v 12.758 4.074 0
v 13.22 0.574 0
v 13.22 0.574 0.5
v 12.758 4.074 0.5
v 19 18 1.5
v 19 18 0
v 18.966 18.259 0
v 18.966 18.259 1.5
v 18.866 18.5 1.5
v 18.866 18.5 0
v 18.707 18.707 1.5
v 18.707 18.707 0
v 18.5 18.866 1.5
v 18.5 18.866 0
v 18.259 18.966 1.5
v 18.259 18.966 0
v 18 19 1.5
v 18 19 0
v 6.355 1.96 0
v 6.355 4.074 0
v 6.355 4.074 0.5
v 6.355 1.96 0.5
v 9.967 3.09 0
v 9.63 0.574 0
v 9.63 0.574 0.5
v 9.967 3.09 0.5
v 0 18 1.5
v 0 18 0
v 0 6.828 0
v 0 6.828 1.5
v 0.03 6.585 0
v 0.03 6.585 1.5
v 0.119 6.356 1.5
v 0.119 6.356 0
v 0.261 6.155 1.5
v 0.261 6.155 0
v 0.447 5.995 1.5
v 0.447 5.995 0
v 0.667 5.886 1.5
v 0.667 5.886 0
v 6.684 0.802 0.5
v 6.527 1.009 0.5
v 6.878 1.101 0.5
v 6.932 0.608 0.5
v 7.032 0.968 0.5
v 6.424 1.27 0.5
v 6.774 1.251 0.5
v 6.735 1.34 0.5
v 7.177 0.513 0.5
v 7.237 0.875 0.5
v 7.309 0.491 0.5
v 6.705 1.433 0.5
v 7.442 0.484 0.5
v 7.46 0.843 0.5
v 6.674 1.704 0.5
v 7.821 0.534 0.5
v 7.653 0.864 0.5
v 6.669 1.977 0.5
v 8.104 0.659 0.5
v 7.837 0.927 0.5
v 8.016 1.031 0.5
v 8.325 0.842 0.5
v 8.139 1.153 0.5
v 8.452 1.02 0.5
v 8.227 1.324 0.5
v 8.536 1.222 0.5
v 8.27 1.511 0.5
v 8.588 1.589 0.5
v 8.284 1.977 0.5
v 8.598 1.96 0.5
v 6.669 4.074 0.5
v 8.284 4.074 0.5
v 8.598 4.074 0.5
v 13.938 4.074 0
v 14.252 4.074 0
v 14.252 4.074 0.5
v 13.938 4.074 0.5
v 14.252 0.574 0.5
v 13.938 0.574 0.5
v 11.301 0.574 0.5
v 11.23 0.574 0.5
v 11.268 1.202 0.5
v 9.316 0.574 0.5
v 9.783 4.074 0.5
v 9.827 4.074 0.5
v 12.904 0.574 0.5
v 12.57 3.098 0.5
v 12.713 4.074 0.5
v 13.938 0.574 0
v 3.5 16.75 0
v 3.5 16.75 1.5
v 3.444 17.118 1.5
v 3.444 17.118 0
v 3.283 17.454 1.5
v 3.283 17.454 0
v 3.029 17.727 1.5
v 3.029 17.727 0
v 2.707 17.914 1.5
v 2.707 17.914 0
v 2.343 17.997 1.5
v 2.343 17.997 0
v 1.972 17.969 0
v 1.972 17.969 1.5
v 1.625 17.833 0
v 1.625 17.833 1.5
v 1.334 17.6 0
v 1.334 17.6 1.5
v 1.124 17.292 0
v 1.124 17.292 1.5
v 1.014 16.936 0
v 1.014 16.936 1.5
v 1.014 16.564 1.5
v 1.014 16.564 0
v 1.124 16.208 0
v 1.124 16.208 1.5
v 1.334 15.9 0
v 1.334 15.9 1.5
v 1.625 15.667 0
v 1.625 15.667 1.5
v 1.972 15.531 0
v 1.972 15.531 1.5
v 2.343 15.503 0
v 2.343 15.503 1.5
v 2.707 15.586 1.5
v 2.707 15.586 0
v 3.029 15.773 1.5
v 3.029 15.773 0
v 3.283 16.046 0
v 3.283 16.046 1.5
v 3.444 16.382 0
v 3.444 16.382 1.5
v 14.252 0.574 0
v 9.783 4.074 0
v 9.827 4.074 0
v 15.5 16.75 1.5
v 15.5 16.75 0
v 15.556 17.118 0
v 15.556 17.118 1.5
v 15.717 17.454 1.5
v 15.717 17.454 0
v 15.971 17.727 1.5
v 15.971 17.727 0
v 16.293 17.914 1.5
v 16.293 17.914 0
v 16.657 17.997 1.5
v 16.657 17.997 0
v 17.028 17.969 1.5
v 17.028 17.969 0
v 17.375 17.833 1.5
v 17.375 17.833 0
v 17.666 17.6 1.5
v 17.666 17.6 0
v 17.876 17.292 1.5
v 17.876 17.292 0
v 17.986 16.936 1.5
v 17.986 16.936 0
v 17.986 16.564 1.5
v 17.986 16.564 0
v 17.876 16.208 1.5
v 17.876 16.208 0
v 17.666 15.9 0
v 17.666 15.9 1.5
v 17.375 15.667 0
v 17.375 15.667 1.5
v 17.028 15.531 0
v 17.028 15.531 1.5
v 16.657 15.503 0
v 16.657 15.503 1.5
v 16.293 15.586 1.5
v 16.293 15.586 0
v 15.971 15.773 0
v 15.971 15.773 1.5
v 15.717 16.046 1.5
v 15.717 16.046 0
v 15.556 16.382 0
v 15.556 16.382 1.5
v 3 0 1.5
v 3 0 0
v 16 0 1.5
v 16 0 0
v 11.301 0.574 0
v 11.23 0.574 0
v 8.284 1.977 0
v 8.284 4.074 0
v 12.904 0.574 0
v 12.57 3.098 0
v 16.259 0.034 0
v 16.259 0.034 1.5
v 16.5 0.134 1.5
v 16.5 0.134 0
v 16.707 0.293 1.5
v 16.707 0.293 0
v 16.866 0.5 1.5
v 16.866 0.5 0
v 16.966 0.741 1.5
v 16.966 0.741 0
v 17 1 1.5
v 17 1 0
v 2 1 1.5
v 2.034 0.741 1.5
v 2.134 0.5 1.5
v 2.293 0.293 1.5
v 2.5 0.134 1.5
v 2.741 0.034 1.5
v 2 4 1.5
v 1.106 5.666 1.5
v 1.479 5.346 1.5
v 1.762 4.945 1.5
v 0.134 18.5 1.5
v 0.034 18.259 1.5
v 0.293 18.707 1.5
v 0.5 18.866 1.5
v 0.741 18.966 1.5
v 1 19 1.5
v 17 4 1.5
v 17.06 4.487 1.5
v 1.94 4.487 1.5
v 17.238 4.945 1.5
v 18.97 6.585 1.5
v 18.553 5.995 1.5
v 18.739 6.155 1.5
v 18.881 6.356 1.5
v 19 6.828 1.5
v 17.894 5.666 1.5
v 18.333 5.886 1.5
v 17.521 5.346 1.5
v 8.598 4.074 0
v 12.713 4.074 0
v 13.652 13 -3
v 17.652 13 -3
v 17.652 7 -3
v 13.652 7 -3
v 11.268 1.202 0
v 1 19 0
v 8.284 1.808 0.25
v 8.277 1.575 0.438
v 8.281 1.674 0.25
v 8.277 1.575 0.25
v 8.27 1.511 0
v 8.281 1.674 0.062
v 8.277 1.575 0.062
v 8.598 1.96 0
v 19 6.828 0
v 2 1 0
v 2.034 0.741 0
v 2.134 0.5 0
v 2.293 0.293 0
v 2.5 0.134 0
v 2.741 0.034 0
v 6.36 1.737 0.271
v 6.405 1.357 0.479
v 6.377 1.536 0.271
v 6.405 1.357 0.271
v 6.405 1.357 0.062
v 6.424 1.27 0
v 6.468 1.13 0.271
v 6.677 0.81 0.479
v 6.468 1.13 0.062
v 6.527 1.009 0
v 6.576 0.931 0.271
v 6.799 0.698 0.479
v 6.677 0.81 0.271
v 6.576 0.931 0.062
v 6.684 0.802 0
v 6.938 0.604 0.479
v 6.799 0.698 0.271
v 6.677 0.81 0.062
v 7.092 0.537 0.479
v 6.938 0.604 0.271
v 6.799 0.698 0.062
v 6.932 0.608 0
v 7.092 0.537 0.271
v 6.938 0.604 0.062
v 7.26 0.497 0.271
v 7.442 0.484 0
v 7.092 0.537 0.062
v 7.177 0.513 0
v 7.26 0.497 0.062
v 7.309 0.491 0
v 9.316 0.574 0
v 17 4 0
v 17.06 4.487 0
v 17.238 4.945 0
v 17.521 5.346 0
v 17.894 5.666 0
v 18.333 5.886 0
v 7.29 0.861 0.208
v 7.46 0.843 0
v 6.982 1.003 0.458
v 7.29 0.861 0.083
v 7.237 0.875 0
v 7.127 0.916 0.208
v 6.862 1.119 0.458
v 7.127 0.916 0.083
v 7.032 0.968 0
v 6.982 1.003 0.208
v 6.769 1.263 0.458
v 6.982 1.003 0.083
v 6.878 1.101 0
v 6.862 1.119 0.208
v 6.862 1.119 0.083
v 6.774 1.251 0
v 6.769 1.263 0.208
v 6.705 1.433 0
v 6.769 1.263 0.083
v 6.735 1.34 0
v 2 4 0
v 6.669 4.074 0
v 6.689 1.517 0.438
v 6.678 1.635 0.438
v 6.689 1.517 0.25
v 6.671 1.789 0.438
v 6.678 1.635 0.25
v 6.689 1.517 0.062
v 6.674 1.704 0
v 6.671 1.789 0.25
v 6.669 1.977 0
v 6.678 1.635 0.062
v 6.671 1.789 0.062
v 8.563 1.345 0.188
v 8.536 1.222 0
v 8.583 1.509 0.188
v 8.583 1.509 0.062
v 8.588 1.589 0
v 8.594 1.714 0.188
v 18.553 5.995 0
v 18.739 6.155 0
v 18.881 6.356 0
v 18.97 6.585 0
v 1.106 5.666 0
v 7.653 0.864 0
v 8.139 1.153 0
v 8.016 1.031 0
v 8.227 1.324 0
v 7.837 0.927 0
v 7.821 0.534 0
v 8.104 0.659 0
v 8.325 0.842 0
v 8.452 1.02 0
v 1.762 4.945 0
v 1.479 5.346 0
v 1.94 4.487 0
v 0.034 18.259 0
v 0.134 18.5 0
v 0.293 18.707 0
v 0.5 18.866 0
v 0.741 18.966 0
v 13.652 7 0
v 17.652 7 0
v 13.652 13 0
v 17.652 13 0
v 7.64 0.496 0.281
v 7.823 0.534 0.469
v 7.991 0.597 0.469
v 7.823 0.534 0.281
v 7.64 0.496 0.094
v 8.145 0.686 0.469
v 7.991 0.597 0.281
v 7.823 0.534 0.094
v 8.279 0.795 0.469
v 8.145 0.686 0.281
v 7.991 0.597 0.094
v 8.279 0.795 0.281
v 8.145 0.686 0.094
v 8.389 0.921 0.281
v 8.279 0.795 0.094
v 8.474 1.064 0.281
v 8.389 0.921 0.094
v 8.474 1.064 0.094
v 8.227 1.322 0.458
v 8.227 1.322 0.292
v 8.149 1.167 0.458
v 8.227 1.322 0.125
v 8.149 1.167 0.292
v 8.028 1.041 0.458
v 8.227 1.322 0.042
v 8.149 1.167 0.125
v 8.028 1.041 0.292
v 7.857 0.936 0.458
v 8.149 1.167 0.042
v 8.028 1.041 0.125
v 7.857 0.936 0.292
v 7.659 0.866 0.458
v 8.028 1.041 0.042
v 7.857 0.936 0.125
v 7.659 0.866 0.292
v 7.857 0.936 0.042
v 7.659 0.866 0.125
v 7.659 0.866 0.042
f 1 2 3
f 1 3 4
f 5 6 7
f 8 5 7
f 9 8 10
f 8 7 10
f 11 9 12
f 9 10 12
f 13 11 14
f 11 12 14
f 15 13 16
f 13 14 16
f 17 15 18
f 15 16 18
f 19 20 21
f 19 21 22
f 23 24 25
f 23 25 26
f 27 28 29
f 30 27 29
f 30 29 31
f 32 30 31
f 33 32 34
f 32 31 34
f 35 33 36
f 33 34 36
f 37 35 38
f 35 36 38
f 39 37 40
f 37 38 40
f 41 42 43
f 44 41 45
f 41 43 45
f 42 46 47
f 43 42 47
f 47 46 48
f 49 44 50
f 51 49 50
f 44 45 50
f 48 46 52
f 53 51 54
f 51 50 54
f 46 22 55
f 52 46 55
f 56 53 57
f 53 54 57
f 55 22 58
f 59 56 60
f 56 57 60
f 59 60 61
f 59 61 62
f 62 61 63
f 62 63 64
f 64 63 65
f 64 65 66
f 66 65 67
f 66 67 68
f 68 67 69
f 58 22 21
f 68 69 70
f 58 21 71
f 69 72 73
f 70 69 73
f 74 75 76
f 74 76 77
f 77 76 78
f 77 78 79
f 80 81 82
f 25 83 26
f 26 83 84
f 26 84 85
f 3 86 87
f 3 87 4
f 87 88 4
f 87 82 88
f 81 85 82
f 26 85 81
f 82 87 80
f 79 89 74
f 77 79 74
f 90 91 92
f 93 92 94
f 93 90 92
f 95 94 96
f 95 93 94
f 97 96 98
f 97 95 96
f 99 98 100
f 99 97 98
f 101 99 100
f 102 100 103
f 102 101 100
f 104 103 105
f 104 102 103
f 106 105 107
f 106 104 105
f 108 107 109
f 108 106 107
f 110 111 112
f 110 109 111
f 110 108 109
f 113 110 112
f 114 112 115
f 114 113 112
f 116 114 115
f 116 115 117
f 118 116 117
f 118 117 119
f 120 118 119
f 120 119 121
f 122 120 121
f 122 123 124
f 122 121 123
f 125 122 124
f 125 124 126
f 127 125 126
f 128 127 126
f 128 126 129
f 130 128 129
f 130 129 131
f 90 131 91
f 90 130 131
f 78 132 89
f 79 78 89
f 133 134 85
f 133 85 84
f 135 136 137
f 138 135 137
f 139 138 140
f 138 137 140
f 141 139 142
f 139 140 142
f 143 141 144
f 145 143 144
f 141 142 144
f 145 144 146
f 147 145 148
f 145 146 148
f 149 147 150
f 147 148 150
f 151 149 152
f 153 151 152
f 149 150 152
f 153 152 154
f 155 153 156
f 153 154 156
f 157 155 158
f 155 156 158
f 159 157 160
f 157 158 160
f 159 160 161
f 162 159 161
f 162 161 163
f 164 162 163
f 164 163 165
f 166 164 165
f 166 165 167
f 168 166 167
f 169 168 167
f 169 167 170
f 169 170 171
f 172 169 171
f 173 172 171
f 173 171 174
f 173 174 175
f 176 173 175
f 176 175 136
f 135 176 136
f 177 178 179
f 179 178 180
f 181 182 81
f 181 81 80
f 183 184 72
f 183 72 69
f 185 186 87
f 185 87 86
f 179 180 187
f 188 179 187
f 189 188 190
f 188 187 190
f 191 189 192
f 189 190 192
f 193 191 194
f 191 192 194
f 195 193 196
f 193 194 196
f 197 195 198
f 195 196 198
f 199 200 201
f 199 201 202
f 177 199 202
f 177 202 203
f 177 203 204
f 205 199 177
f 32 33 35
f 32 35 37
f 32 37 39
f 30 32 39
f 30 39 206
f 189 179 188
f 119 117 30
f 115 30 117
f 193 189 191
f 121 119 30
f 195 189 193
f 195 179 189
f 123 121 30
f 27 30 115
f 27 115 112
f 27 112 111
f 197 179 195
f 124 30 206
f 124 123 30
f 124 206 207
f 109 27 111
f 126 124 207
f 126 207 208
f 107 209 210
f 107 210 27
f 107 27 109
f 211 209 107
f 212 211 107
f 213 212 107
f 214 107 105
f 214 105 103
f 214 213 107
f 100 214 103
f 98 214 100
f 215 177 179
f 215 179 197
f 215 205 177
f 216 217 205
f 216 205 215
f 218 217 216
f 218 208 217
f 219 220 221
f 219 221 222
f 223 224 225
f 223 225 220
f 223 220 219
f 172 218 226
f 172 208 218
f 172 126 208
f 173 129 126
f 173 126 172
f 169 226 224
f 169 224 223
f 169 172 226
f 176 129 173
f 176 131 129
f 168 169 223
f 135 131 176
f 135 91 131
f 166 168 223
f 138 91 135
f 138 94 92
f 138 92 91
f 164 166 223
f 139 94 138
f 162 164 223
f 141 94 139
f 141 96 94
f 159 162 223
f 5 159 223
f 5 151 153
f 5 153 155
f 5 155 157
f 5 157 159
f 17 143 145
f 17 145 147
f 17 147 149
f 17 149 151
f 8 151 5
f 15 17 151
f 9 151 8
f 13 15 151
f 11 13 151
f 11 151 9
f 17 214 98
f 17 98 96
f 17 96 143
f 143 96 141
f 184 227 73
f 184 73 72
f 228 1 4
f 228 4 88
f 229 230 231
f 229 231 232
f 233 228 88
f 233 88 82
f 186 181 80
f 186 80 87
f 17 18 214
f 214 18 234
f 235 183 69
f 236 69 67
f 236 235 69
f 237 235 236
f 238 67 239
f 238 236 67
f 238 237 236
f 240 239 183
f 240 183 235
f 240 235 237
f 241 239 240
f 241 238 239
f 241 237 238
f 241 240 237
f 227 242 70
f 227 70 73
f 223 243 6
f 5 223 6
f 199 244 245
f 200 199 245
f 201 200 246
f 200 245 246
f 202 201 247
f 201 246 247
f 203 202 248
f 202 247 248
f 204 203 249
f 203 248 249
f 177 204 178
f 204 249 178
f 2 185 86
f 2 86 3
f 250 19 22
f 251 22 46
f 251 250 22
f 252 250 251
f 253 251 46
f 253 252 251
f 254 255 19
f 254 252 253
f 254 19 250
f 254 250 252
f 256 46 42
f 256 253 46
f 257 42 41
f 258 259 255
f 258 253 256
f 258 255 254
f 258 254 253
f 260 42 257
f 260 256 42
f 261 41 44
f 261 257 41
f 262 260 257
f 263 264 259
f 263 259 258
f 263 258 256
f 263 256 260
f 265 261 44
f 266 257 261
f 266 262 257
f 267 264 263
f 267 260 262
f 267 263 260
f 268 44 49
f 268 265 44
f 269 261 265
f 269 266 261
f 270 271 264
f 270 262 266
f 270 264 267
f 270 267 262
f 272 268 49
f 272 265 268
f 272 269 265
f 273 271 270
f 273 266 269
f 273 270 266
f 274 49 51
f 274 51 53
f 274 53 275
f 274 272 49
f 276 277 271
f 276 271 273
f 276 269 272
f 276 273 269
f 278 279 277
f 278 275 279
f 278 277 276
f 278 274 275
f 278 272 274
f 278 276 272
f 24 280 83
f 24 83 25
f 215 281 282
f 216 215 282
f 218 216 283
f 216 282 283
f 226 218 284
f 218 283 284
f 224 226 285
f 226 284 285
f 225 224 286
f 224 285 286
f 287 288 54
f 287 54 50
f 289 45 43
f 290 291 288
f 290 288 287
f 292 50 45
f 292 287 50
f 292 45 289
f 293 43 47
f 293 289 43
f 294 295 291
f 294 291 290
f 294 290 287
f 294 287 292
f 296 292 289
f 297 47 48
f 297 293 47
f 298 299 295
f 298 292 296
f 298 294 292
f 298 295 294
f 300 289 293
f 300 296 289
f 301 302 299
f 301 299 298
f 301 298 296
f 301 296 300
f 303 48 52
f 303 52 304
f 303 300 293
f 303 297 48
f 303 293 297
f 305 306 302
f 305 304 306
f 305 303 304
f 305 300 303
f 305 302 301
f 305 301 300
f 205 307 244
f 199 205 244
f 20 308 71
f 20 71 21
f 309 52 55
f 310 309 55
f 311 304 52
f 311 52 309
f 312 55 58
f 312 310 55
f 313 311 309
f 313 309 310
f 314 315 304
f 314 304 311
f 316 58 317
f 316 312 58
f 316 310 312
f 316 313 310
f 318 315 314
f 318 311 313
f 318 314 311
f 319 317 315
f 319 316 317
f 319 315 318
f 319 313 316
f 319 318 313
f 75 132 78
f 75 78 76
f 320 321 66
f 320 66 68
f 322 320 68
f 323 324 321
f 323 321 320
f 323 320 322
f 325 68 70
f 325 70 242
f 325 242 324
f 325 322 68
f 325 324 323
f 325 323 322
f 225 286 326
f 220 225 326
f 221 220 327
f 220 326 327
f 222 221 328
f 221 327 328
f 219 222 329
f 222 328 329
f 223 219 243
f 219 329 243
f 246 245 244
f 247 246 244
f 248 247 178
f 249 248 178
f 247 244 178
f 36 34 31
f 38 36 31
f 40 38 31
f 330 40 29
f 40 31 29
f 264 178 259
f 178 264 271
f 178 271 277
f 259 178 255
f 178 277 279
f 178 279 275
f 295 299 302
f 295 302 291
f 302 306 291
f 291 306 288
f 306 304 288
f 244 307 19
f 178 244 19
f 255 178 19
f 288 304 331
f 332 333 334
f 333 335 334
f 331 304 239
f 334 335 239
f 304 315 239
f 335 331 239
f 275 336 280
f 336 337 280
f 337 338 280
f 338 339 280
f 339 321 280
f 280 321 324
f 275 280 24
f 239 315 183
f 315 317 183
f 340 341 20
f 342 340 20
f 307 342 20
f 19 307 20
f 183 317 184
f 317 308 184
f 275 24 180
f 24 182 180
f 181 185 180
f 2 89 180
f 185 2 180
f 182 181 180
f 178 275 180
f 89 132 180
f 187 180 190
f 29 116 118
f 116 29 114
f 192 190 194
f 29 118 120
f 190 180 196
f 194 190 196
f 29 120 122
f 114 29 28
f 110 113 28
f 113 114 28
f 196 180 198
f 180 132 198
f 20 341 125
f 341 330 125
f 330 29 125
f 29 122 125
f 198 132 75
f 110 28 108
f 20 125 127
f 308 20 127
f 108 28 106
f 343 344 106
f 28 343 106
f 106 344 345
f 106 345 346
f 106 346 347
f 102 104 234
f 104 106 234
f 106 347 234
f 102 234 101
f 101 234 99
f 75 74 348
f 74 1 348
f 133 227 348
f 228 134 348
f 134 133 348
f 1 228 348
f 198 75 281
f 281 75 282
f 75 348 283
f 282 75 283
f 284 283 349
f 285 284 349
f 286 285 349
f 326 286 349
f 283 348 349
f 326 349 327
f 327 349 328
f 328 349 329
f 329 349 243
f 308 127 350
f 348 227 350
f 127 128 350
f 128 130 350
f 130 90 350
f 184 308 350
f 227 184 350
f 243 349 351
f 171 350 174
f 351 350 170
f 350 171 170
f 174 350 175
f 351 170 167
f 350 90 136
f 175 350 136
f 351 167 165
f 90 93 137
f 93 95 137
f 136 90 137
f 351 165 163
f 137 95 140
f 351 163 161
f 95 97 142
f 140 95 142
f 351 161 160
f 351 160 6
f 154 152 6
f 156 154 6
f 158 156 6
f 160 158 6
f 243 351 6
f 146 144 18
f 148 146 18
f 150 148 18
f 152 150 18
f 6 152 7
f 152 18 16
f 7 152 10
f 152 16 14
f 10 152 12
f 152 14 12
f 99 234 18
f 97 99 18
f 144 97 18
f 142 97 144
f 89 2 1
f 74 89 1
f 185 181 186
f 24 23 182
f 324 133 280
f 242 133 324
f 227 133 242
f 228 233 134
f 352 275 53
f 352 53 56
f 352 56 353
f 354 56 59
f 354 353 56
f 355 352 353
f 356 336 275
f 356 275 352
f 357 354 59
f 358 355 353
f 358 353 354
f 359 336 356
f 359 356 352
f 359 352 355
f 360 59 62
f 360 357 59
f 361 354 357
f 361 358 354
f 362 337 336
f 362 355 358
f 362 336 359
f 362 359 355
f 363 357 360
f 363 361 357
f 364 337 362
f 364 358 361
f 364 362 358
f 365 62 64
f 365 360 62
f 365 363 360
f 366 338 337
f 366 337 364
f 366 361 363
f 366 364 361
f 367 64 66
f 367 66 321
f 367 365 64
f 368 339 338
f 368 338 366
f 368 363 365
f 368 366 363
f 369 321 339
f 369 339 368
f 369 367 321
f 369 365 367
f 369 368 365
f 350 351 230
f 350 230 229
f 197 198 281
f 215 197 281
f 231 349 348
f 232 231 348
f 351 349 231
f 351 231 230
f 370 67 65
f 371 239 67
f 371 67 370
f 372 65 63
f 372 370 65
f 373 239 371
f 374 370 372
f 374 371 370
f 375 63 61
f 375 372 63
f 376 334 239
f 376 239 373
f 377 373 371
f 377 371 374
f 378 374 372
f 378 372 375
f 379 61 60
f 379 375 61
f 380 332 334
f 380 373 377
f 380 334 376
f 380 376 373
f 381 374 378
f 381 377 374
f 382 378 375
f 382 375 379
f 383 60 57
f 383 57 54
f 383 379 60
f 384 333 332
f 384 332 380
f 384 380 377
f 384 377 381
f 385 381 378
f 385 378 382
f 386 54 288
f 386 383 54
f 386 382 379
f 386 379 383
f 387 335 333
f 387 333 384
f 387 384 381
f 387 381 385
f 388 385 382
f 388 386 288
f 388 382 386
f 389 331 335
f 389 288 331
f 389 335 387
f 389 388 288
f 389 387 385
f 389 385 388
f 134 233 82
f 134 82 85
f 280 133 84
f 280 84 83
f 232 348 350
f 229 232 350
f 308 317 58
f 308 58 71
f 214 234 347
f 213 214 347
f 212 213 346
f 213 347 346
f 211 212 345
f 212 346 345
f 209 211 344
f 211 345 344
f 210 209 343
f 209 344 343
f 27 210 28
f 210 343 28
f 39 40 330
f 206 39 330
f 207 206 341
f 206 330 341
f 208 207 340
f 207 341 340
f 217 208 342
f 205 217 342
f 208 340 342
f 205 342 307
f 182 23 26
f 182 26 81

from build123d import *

# Parameters (mm, degrees)
BOSS_EXTRUDE1_DEPTH = 1.5
SKETCH2_R           = 1.25
CUT_EXTRUDE1_DEPTH  = 27.911893282
SKETCH3_W           = 4
SKETCH3_H           = 6
BOSS_EXTRUDE2_DEPTH = 3
SKETCH4_W           = 0.314102564
SKETCH4_H           = 3.5
CUT_EXTRUDE2_DEPTH  = 0.5


with BuildPart() as part:
    # Sketch1 → Boss-Extrude1 (new body)
    with BuildSketch(Plane.XY):
        with BuildLine():
            Line((3, 0), (16, 0))
            ThreePointArc((16, 0), (16.707106781, 0.292893219), (17, 1))
            Line((17, 1), (17, 4))
            ThreePointArc((17, 4), (17.367006838, 5.154700538), (18.333333333, 5.885618083))
            ThreePointArc((18.333333333, 5.885618083), (18.816496581, 6.251076856), (19, 6.828427125))
            Line((19, 6.828427125), (19, 18))
            ThreePointArc((19, 18), (18.707106781, 18.707106781), (18, 19))
            Line((18, 19), (1, 19))
            ThreePointArc((1, 19), (0.292893219, 18.707106781), (0, 18))
            Line((0, 18), (0, 6.828427125))
            ThreePointArc((0, 6.828427125), (0.183503419, 6.251076856), (0.666666667, 5.885618083))
            ThreePointArc((0.666666667, 5.885618083), (1.632993162, 5.154700538), (2, 4))
            Line((2, 4), (2, 1))
            ThreePointArc((2, 1), (2.292893219, 0.292893219), (3, 0))
        make_face()
    extrude(amount=BOSS_EXTRUDE1_DEPTH)

    # Sketch2 → Cut-Extrude1 (cut, through all)
    with BuildSketch(Plane(origin=(0, 0, 0), x_dir=(-1, 0, 0), z_dir=(0, 0, -1))):
        with Locations((-16.75, 16.75)):
            Circle(SKETCH2_R)
    cut_extrude1 = extrude(amount=-CUT_EXTRUDE1_DEPTH, mode=Mode.SUBTRACT)

    # Mirror1: Cut-Extrude1 across plane
    add(cut_extrude1.mirror(Plane.ZY.offset(-9.5)), mode=Mode.SUBTRACT)

    # Sketch3 → Boss-Extrude2 (add)
    with BuildSketch(Plane(origin=(0, 0, 0), x_dir=(-1, 0, 0), z_dir=(0, 0, -1))):
        with Locations((-15.652122357, 10)):
            Rectangle(SKETCH3_W, SKETCH3_H)
    extrude(amount=BOSS_EXTRUDE2_DEPTH)

    # Sketch4 → Cut-Extrude2 (cut)
    with BuildSketch(Plane(origin=(0, 0, 0), x_dir=(-1, 0, 0), z_dir=(0, 0, -1))):
        with Locations((-14.095226395, 2.323572114)):
            Rectangle(SKETCH4_W, SKETCH4_H)
        Polygon((-13.220226395, 0.573572114), (-12.758187132, 4.073572114), (-12.713315337, 4.073572114), (-11.268303318, 1.201777242), (-9.82749803, 4.073572114), (-9.782626235, 4.073572114), (-9.316380241, 0.573572114), (-9.630482805, 0.573572114), (-9.967021267, 3.089898236), (-11.229741619, 0.573572114), (-11.301256042, 0.573572114), (-12.569585369, 3.097610576), (-12.904020466, 0.573572114), align=None)
        with BuildLine():
            Line((-8.598431523, 4.073572114), (-8.284328959, 4.073572114))
            Line((-8.284328959, 4.073572114), (-8.284328959, 1.976516826))
            add(Edge.make_bspline(
                [(-8.284328959, 1.976516826), (-8.284375703, 1.94683609), (-8.284464408, 1.890511779), (-8.283871894, 1.810343478), (-8.282212526, 1.739071019), (-8.281166366, 1.676419672), (-8.278839032, 1.622676924), (-8.276940986, 1.577551614), (-8.274500429, 1.541257411), (-8.271567311, 1.520076485), (-8.270306523, 1.510971954)],
                knots=[0, 0, 0, 0, 1.528628734, 2.90083645, 4.128790002, 5.200304208, 6.127813768, 6.898992206, 7.526736466, 8, 8, 8, 8], degree=3))
            add(Edge.make_bspline(
                [(-8.270306523, 1.510971954), (-8.265129064, 1.478125191), (-8.255065878, 1.414282461), (-8.2294195, 1.32337418), (-8.193601999, 1.241442721), (-8.151158957, 1.16593143), (-8.095226345, 1.09894207), (-8.02822281, 1.037230417), (-7.947045041, 0.983258613), (-7.856784436, 0.933907801), (-7.759499198, 0.894242719), (-7.660087932, 0.864249354), (-7.560044953, 0.845970454), (-7.493068788, 0.843853915), (-7.459809728, 0.842802883)],
                knots=[0, 0, 0, 0, 1.035780045, 2.013197591, 2.933192213, 3.817615948, 4.702609284, 5.640816605, 6.646850145, 7.73207398, 8.84249596, 9.914020372, 10.964143139, 12, 12, 12, 12], degree=3))
            add(Edge.make_bspline(
                [(-7.459809728, 0.842802883), (-7.431255988, 0.843876734), (-7.374313426, 0.846018232), (-7.289706995, 0.859279663), (-7.207306887, 0.883180229), (-7.126706207, 0.914019987), (-7.051155222, 0.954767578), (-6.98061178, 1.001838418), (-6.917647846, 1.057049294), (-6.860189848, 1.118149638), (-6.810154912, 1.187089438), (-6.766783771, 1.262367576), (-6.731257841, 1.345116923), (-6.713714316, 1.403271345), (-6.704701555, 1.433147435)],
                knots=[0, 0, 0, 0, 0.994687771, 1.983630487, 2.973142513, 3.978332533, 4.983357753, 5.956394766, 6.925816176, 7.893390482, 8.871859704, 9.88551698, 10.913711441, 12, 12, 12, 12], degree=3))
            add(Edge.make_bspline(
                [(-6.704701555, 1.433147435), (-6.70170143, 1.445496009), (-6.695015942, 1.473013609), (-6.688768897, 1.5195349), (-6.682262371, 1.574424264), (-6.677747801, 1.638076076), (-6.673346581, 1.710277049), (-6.670713508, 1.791403307), (-6.669496475, 1.881160267), (-6.669133795, 1.943797429), (-6.668944344, 1.976516826)],
                knots=[0, 0, 0, 0, 0.558680831, 1.244966039, 2.062412453, 2.990489873, 4.051219941, 5.244515665, 6.560634259, 8, 8, 8, 8], degree=3))
            Line((-6.668944344, 1.976516826), (-6.668944344, 4.073572114))
            Line((-6.668944344, 4.073572114), (-6.35484178, 4.073572114))
            Line((-6.35484178, 4.073572114), (-6.35484178, 1.959689903))
            add(Edge.make_bspline(
                [(-6.35484178, 1.959689903), (-6.3550959, 1.921591524), (-6.355591831, 1.847240221), (-6.359892408, 1.738288862), (-6.366749408, 1.63493588), (-6.376437496, 1.537167384), (-6.389274499, 1.445333225), (-6.403549719, 1.358628457), (-6.421729252, 1.277675464), (-6.442962654, 1.201843046), (-6.467236202, 1.129657533), (-6.49867735, 1.061148918), (-6.53410185, 0.994234519), (-6.576116503, 0.92992641), (-6.623327885, 0.867939856), (-6.676779566, 0.808650781), (-6.734703727, 0.751111735), (-6.798063287, 0.696798669), (-6.865813812, 0.646989992), (-6.93775377, 0.603192221), (-7.013330539, 0.566168604), (-7.092347666, 0.535692679), (-7.174838868, 0.51277808), (-7.260806228, 0.495702924), (-7.350445421, 0.486000627), (-7.411410078, 0.484558697), (-7.442281683, 0.483828524)],
                knots=[0, 0, 0, 0, 1.316592851, 2.569410997, 3.76748051, 4.895814652, 5.963796859, 6.97159953, 7.931736103, 8.829262218, 9.692595152, 10.560224239, 11.431080259, 12.30701507, 13.211635791, 14.121146779, 15.063487852, 16.031507147, 17.00238618, 17.966455255, 18.938106653, 19.907068911, 20.888905087, 21.893141452, 22.933117798, 24, 24, 24, 24], degree=3))
            add(Edge.make_bspline(
                [(-7.442281683, 0.483828524), (-7.475950786, 0.48461329), (-7.542009445, 0.486152996), (-7.639347512, 0.494975746), (-7.732661709, 0.511594141), (-7.822937586, 0.532754085), (-7.908946083, 0.561937822), (-7.991839527, 0.596035947), (-8.070198208, 0.637913207), (-8.145293337, 0.6845066), (-8.215118093, 0.736931238), (-8.279215496, 0.794071412), (-8.337691367, 0.855011789), (-8.389560063, 0.920412155), (-8.435680948, 0.989763862), (-8.475411161, 1.063263102), (-8.509524405, 1.140881418), (-8.527130972, 1.194834619), (-8.536031683, 1.222109774)],
                knots=[0, 0, 0, 0, 1.13879206, 2.234305948, 3.301075583, 4.341971843, 5.366689343, 6.369221514, 7.369726634, 8.367512178, 9.355451585, 10.318319045, 11.268648973, 12.207971039, 13.137398894, 14.081662264, 15.030215811, 16, 16, 16, 16], degree=3))
            add(Edge.make_bspline(
                [(-8.536031683, 1.222109774), (-8.541208842, 1.240742349), (-8.552438213, 1.281156818), (-8.564463511, 1.348043306), (-8.574572592, 1.425058224), (-8.584078151, 1.512206842), (-8.589687108, 1.609556709), (-8.594604547, 1.717065625), (-8.598466166, 1.834863587), (-8.598443394, 1.916918102), (-8.598431523, 1.959689903)],
                knots=[0, 0, 0, 0, 0.625038921, 1.35572334, 2.194682327, 3.136881307, 4.189498639, 5.346923369, 6.617055217, 8, 8, 8, 8], degree=3))
            Line((-8.598431523, 1.959689903), (-8.598431523, 4.073572114))
        make_face()
    extrude(amount=-CUT_EXTRUDE2_DEPTH, mode=Mode.SUBTRACT)


solid = part.part
